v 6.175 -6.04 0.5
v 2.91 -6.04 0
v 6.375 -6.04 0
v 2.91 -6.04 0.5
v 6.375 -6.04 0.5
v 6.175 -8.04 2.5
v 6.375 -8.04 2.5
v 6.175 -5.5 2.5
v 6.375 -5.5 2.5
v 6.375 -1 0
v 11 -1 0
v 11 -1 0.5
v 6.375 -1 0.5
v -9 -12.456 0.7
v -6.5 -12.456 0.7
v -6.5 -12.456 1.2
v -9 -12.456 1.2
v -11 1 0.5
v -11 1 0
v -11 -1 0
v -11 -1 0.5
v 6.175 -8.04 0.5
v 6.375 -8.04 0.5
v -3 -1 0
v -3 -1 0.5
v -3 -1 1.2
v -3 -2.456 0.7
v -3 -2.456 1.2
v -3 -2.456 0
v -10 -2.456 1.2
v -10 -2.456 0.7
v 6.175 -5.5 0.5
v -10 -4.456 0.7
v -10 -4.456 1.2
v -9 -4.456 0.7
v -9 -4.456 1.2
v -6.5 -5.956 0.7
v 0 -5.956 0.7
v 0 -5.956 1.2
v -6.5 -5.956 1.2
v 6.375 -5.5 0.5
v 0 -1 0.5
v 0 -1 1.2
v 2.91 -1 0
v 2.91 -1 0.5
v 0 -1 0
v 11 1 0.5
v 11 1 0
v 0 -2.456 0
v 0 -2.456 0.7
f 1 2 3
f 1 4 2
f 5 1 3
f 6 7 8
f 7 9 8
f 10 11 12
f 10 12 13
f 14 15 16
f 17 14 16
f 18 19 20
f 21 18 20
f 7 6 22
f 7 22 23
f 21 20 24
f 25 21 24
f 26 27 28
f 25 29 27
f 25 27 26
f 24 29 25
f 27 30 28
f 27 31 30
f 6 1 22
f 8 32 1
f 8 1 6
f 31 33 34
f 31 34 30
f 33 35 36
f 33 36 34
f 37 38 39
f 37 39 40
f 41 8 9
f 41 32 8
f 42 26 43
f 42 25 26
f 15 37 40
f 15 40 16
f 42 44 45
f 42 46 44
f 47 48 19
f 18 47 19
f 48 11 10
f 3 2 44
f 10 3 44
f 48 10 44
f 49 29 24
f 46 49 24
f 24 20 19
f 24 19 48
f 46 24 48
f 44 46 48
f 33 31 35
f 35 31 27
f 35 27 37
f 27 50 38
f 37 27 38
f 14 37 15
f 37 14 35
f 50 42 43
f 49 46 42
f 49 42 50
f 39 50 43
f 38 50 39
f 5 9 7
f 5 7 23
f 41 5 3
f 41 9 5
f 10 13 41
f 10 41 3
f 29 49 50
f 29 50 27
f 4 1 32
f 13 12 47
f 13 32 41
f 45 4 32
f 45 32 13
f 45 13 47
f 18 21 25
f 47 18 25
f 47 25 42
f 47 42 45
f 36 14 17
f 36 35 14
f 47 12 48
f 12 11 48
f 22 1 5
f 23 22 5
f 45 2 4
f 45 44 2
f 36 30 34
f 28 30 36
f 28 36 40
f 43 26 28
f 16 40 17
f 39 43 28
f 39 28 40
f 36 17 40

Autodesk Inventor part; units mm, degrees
ref_plane "YZ Plane" through (0, 0, 0) normal (1, 0, 0) x (0, 1, 0)
ref_plane "XZ Plane" through (0, 0, 0) normal (0, 1, 0) x (-1, 0, 0)
ref_plane "XY Plane" through (0, 0, 0) normal (0, 0, 1) x (1, 0, 0)
sketch "Sketch1" plane through (0, 0, 0) normal (0, 0, 1) x (1, 0, 0)
  line L0 (11, -1) -> (11, 1)
  line L1 (11, 1) -> (-11, 1)
  line L2 (-11, 1) -> (-11, -1)
  line L3 (-11, -1) -> (11, 1) construction
  line L4 (11, -1) -> (-11, 1) construction
  line L5 (11, -1) -> (5.2, -1)
  line L6 (5.2, -1) -> (5.2, -8)
  line L7 (5.2, -8) -> (2.2, -8)
  line L8 (2.2, -8) -> (2.2, -1)
  line L9 (2.2, -1) -> (0, -1)
  line L10 (-10, -2.4556) -> (-3, -2.4556)
  line L11 (-3, -2.4556) -> (-3, -1)
  line L12 (-11, -1) -> (-3, -1)
  line L13 (0, -1) -> (2.2, -1)
  line L14 (5.2, -1) -> (11, -1)
  line L15 (-10, -2.4556) -> (-10, -4.4556)
  line L16 (-10, -4.4556) -> (-8.5, -4.4556)
  line L17 (-8.5, -4.4556) -> (-8.5, -12.4556)
  line L18 (-8.5, -12.4556) -> (-6.5, -12.4556)
  line L19 (-6.5, -12.4556) -> (-6.5, -4.4556)
  line L20 (-6.5, -4.4556) -> (0, -4.4556)
  line L21 (0, -1) -> (0, -4.4556)
  line L22 (5.2, -8) -> (5.7, -8)
  line L23 (5.7, -8) -> (5.7, -6)
  line L24 (5.7, -6) -> (5.2, -6)
  line L25 (5.2, -6) -> (5.2, -8)
  point P0 (0, 0)
  dimension "d0" = 22
  dimension "d1" = 2
  dimension "d2" = 5.8
  dimension "d3" = 7
  dimension "d4" = 3
  dimension "d5" = 2.2
  dimension "d8" = 7
  dimension "d9" = 2
  dimension "d11" = 8
  dimension "d12" = 2
  dimension "d13" = 0.5
  dimension "d14" = 2
extrude "Extrusion1" add sketch "Sketch1" along normal blind 0.5 contours L5 L6 L7 L8 L9 L21 L20 L19 L18 L17 L16 L15 L10 L11 L12 L2 L1 L0
sketch "Sketch2" plane through (0, 0, 0.5) normal (0, 0, 1) x (1, 0, 0)
  line L0 (5.2, -8) -> (5.2, -1) projected
  line L1 (5.2, -8) -> (5.7, -8)
  line L2 (5.7, -8) -> (5.7, -6)
  line L3 (5.7, -6) -> (5.2, -6)
  line L4 (5.2, -6) -> (5.2, -8)
  point P0 (0, 0)
  point P1 (5.2, -6)
  dimension "d17" = 0.5
  dimension "d18" = 2
extrude "Extrusion2" add sketch "Sketch2" along normal blind 2
sketch "Sketch3" plane through (0, 0, 0.5) normal (0, 0, -1) x (-1, 0, 0)
  line L0 (-5.7, -6) -> (-5.2, -6) projected
  line L1 (-5.7, -8) -> (-5.7, -6) projected
  line L2 (-5.2, -8) -> (-5.7, -8) projected
  line L3 (-5.2, -8) -> (-5.2, -6) projected
  point P0 (0, 0)
extrude "Extrusion3" add sketch "Sketch3" along normal blind 0.5
sketch "Sketch4" plane through (0, 0, 0.5) normal (0, 0, 1) x (1, 0, 0)
  line L0 (11, 1) -> (-11, 1) projected
  line L1 (-11, 1) -> (-11, -1) projected
  line L2 (-11, -1) -> (-3, -1) projected
  line L3 (-3, -1) -> (-3, -2.4556) projected
  line L4 (-3, -2.4556) -> (-10, -2.4556) projected
  line L5 (-10, -2.4556) -> (-10, -4.4556) projected
  line L6 (-10, -4.4556) -> (-8.5, -4.4556) projected
  line L7 (-8.5, -4.4556) -> (-8.5, -12.4556) projected
  line L8 (-8.5, -12.4556) -> (-6.5, -12.4556) projected
  line L9 (-6.5, -12.4556) -> (-6.5, -4.4556) projected
  line L10 (-6.5, -4.4556) -> (0, -4.4556) projected
  line L11 (0, -4.4556) -> (0, -1) projected
  line L12 (0, -1) -> (2.2, -1) projected
  line L13 (2.2, -1) -> (2.2, -8) projected
  line L14 (2.2, -8) -> (5.2, -8) projected
  line L15 (5.2, -8) -> (5.2, -6) projected
  line L16 (5.2, -6) -> (5.2, -1) projected
  line L17 (5.2, -1) -> (11, -1) projected
  line L18 (11, -1) -> (11, 1) projected
  line L19 (-3, -1) -> (-3, -2.4556) projected
  line L20 (0, -1) -> (2.2, -1) projected
  line L21 (-3, -1) -> (0, -1)
  point P0 (0, 0)
extrude "Extrusion4" add sketch "Sketch4" along normal blind 0.7 contours L21 L11 L10 L9 L8 L7 L6 L5 L4 L3
sketch "Sketch5" plane through (0, 0, 0) normal (0, 0, -1) x (-1, 0, 0)
  line L0 (-11, 1) -> (11, 1) projected
  line L1 (-11, -1) -> (-11, 1) projected
  line L2 (-5.2, -1) -> (-11, -1) projected
  line L3 (-5.2, -6) -> (-5.2, -1) projected
  line L4 (-5.2, -6) -> (-5.7, -6) projected
  line L5 (-5.7, -6) -> (-5.7, -8) projected
  line L6 (-2.2, -8) -> (-5.7, -8) projected
  line L7 (-2.2, -1) -> (-2.2, -8) projected
  line L8 (0, -1) -> (-2.2, -1) projected
  line L9 (0, -4.4556) -> (0, -1) projected
  line L10 (6.5, -4.4556) -> (0, -4.4556) projected
  line L11 (6.5, -12.4556) -> (6.5, -4.4556) projected
  line L12 (8.5, -12.4556) -> (6.5, -12.4556) projected
  line L13 (8.5, -4.4556) -> (8.5, -12.4556) projected
  line L14 (10, -4.4556) -> (8.5, -4.4556) projected
  line L15 (10, -2.4556) -> (10, -4.4556) projected
  line L16 (3, -2.4556) -> (10, -2.4556) projected
  line L17 (3, -1) -> (3, -2.4556) projected
  line L18 (11, -1) -> (3, -1) projected
  line L19 (11, 1) -> (11, -1) projected
  line L20 (3, -2.4556) -> (0, -2.4556)
  line L21 (0, -4.4556) -> (0, -1) projected
  point P0 (0, 0)
extrude "Extrusion5" cut sketch "Sketch5" against normal blind 0.5 contours L16 L15 L14 L13 L12 L11 L10 L9 L20
sketch "Sketch6" plane through (-6.5, -4.4556, 1.2) normal (0, -1, 0) x (1, 0, 0)
  line L0 (6.5, -0.7) -> (6.5, 0) projected
  line L1 (0, 0) -> (6.5, 0) projected
  line L2 (6.5, -0.7) -> (0, -0.7)
  line L3 (0, -0.7) -> (0, 0)
  line L4 (0, 0) -> (6.5, 0)
  line L5 (6.5, 0) -> (6.5, -0.7)
  point P0 (6.5, -1.2)
extrude "Extrusion6" add sketch "Sketch6" along normal blind 1.5
sketch "Sketch7" plane through (5.7, -8, 2.5) normal (1, 0, 0) x (0, 0, -1)
  line L0 (0, 2) -> (2.5, 2) projected
  line L1 (0, 0) -> (0, 2) projected
  line L2 (2.5, 0) -> (0, 0) projected
  line L3 (2.5, 2) -> (2.5, 0) projected
  point P0 (2.5, 8)
extrude "Extrusion7" add sketch "Sketch7" along normal blind 0.5
sketch "Sketch8" plane through (5.2, -8, 0.5) normal (-1, 0, 0) x (0, 0, 1)
  line L0 (0, 0) -> (0, 2) projected
  line L1 (0, 0) -> (2, 0) projected
  line L2 (2, 2) -> (2, 0) projected
  line L3 (0, 2) -> (2, 2) projected
  point P0 (-0.5, 8)
extrude "Extrusion8" cut sketch "Sketch8" against normal blind 0.5
sketch "Sketch9" plane through (0, 0, 1.2) normal (0, 0, 1) x (1, 0, 0)
  line L0 (-10, -2.4556) -> (-10, -4.4556) projected
  line L1 (-10, -4.4556) -> (-8.5, -4.4556) projected
  line L2 (-8.5, -4.4556) -> (-8.5, -12.4556) projected
  line L3 (-8.5, -12.4556) -> (-6.5, -12.4556) projected
  line L4 (-6.5, -12.4556) -> (-6.5, -5.9556) projected
  line L5 (0, -5.9556) -> (-6.5, -5.9556) projected
  line L6 (0, -1) -> (0, -5.9556) projected
  line L7 (0, -1) -> (-3, -1) projected
  line L8 (-3, -1) -> (-3, -2.4556) projected
  line L9 (-3, -2.4556) -> (-10, -2.4556) projected
  point P0 (0, 0)
extrude "Extrusion9" cut sketch "Sketch9" against normal blind 0.2
sketch "Sketch10" plane through (0, 0, 0.5) normal (0, 0, -1) x (-1, 0, 0)
  line L0 (6.5, -12.4556) -> (6.5, -5.9556) projected
  line L1 (8.5, -12.4556) -> (6.5, -12.4556) projected
  line L2 (8.5, -4.4556) -> (8.5, -12.4556) projected
  line L3 (10, -4.4556) -> (8.5, -4.4556) projected
  line L4 (10, -2.4556) -> (10, -4.4556) projected
  line L5 (3, -2.4556) -> (10, -2.4556) projected
  line L6 (0, -2.4556) -> (3, -2.4556) projected
  line L7 (0, -5.9556) -> (0, -2.4556) projected
  line L8 (6.5, -5.9556) -> (0, -5.9556) projected
  point P0 (0, 0)
extrude "Extrusion10" add sketch "Sketch10" along normal blind 0.3
sketch "Sketch11" plane through (0, 0, 1) normal (0, 0, 1) x (1, 0, 0)
  line L0 (-3, -2.4556) -> (-3, -1) projected
  line L1 (-10, -2.4556) -> (-3, -2.4556) projected
  line L2 (-10, -4.4556) -> (-10, -2.4556) projected
  line L3 (-8.5, -4.4556) -> (-10, -4.4556) projected
  line L4 (-8.5, -12.4556) -> (-8.5, -4.4556) projected
  line L5 (-6.5, -12.4556) -> (-8.5, -12.4556) projected
  line L6 (-6.5, -5.9556) -> (-6.5, -12.4556) projected
  line L7 (0, -5.9556) -> (-6.5, -5.9556) projected
  line L8 (0, -1) -> (0, -5.9556) projected
  line L9 (-3, -1) -> (0, -1) projected
  point P0 (0, 0)
extrude "Extrusion11" cut sketch "Sketch11" against normal blind 0.3
sketch "Sketch12" plane through (0, 0, 0.7) normal (0, 0, 1) x (1, 0, 0)
  line L0 (-10, -4.4556) -> (-10, -2.4556) projected
  line L1 (-8.5, -4.4556) -> (-10, -4.4556) projected
  line L2 (-8.5, -12.4556) -> (-8.5, -4.4556) projected
  line L3 (-6.5, -12.4556) -> (-8.5, -12.4556) projected
  line L4 (-6.5, -5.9556) -> (-6.5, -12.4556) projected
  line L5 (0, -5.9556) -> (-6.5, -5.9556) projected
  line L6 (0, -1) -> (0, -5.9556) projected
  line L7 (-3, -1) -> (0, -1) projected
  line L8 (-3, -2.4556) -> (-3, -1) projected
  line L9 (-10, -2.4556) -> (-3, -2.4556) projected
  point P0 (0, 0)
extrude "Extrusion12" add sketch "Sketch12" along normal blind 0.5
sketch "Sketch13" plane through (0, 0, 0.2) normal (0, 0, -1) x (-1, 0, 0)
  line L0 (8.5, -12.4556) -> (8.5, -4.4556) projected
  line L1 (8.5, -4.4556) -> (10, -4.4556) projected
  line L2 (10, -4.4556) -> (10, -2.4556) projected
  line L3 (10, -2.4556) -> (3, -2.4556) projected
  line L4 (0, -2.4556) -> (3, -2.4556) projected
  line L5 (0, -2.4556) -> (0, -5.9556) projected
  line L6 (0, -5.9556) -> (6.5, -5.9556) projected
  line L7 (6.5, -5.9556) -> (6.5, -12.4556) projected
  line L8 (6.5, -12.4556) -> (8.5, -12.4556) projected
  point P0 (0, 0)
extrude "Extrusion13" cut sketch "Sketch13" against normal blind 0.5
sketch "Sketch14" plane through (6.2, -8, 2.5) normal (1, 0, 0) x (0, 0, -1)
  line L0 (0, 0) -> (2.5, 0) projected
  line L1 (2.5, 0) -> (2.5, 2) projected
  line L2 (2.5, 2) -> (0, 2) projected
  line L3 (0, 2) -> (0, 0) projected
  point P0 (2.5, 8)
extrude "Extrusion14" add sketch "Sketch14" along normal blind 0.3
sketch "Sketch15" plane through (5.7, -8, 0.5) normal (-1, 0, 0) x (0, 0, 1)
  line L0 (2, 2) -> (2, 0) projected
  line L1 (0, 2) -> (2, 2) projected
  line L2 (0, 0) -> (0, 2) projected
  line L3 (2, 0) -> (0, 0) projected
  point P0 (-0.5, 8)
extrude "Extrusion15" cut sketch "Sketch15" against normal blind 0.3
sketch "Sketch16" plane through (2.2, -8, 0) normal (-1, 0, 0) x (0, 0, 1)
  line L0 (0, 7) -> (0, 0) projected
  line L1 (0, 0) -> (0.5, 0) projected
  line L2 (0.5, 7) -> (0.5, 0) projected
  line L3 (0, 7) -> (0.5, 7) projected
  point P0 (0, 8)
extrude "Extrusion16" add sketch "Sketch16" along normal blind 0.04
sketch "Sketch17" plane through (6, -8, 0.5) normal (-1, 0, 0) x (0, 0, 1)
  line L0 (0, 0) -> (0, 2) projected
  line L1 (2, 0) -> (0, 0) projected
  line L2 (2, 2) -> (2, 0) projected
  line L3 (0, 2) -> (2, 2) projected
  point P0 (-0.5, 8)
extrude "Extrusion17" add sketch "Sketch17" along normal blind 0.125
sketch "Sketch18" plane through (6.5, -8, 2.5) normal (1, 0, 0) x (0, 0, -1)
  line L0 (2.5, 0) -> (2.5, 2) projected
  line L1 (2.5, 2) -> (0, 2) projected
  line L2 (0, 2) -> (0, 0) projected
  line L3 (0, 0) -> (2.5, 0) projected
  point P0 (2.5, 8)
extrude "Extrusion18" cut sketch "Sketch18" against normal blind 0.125
sketch "Sketch19" plane through (5.2, -1, 0.5) normal (1, 0, 0) x (0, 0, -1)
  line L0 (0, -5) -> (0.5, -5) projected
  line L1 (0.5, -5) -> (0.5, 0) projected
  line L2 (0.5, 0) -> (0, 0) projected
  line L3 (0, -5) -> (0, 0) projected
  point P0 (0.5, 1)
extrude "Extrusion19" add sketch "Sketch19" along normal blind 1.175
sketch "Sketch20" plane through (5.875, -6, 2.5) normal (0, 1, 0) x (1, 0, 0)
  line L0 (0.5, 2) -> (0, 2) projected
  line L1 (0, 0) -> (0, 2) projected
  line L2 (0, 0) -> (0.5, 0) projected
  line L3 (0.5, 0) -> (0.5, 2) projected
  point P0 (-5.875, 2.5)
extrude "Extrusion20" add sketch "Sketch20" along normal blind 2
sketch "Sketch21" plane through (2.16, -8, 0) normal (0, -1, 0) x (1, 0, 0)
  line L0 (4.215, 0) -> (4.215, 2.5) projected
  line L1 (3.715, 2.5) -> (4.215, 2.5) projected
  line L2 (3.715, 0.5) -> (3.715, 2.5) projected
  line L3 (3.715, 0.5) -> (0, 0.5) projected
  line L4 (0, 0) -> (0, 0.5) projected
  line L5 (4.215, 0) -> (0, 0) projected
  point P0 (-2.16, 0)
extrude "Extrusion21" cut sketch "Sketch21" against normal blind 1.96
sketch "Sketch22" plane through (5.875, -4, 2.5) normal (0, 1, 0) x (1, 0, 0)
  line L0 (0.5, 0) -> (0.5, 2) projected
  line L1 (0, 2) -> (0.5, 2) projected
  line L2 (0, 2) -> (0, 0) projected
  line L3 (0, 0) -> (0.5, 0) projected
  point P0 (-5.875, 2.5)
extrude "Extrusion22" cut sketch "Sketch22" against normal blind 1.5
sketch "Sketch23" plane through (2.16, -6.04, 0) normal (0, -1, 0) x (1, 0, 0)
  line L0 (0, 0.5) -> (3.715, 0.5) projected
  line L1 (4.215, 2.5) -> (4.215, 0) projected
  line L2 (3.715, 0.5) -> (4.215, 0.5)
  line L3 (4.215, 0.5) -> (4.215, 2.5)
  line L4 (4.215, 2.5) -> (3.715, 2.5)
  line L5 (3.715, 2.5) -> (3.715, 0.5)
  point P0 (-2.16, 0)
extrude "Extrusion23" add sketch "Sketch23" along normal blind 2
sketch "Sketch24" plane through (2.16, -8, 0) normal (-1, 0, 0) x (0, 0, 1)
  line L0 (0, 1.96) -> (0.5, 1.96) projected
  line L1 (0.5, 1.96) -> (0.5, 7) projected
  line L2 (0, 7) -> (0.5, 7) projected
  line L3 (0, 7) -> (0, 1.96) projected
  point P0 (0, 8)
extrude "Extrusion24" cut sketch "Sketch24" against normal blind 0.75
sketch "Sketch25" plane through (5.875, -8, 0.5) normal (-1, 0, 0) x (0, 0, 1)
  line L0 (2, 2.5) -> (0, 2.5) projected
  line L1 (0, 1.96) -> (0, 2.5) projected
  line L2 (0, 1.96) -> (0, -0.04) projected
  line L3 (2, -0.04) -> (0, -0.04) projected
  line L4 (2, -0.04) -> (2, 2.5) projected
  point P0 (-0.5, 8)
extrude "Extrusion25" cut sketch "Sketch25" against normal blind 0.3
sketch "Sketch26" plane through (-8.5, -12.4556, 1.2) normal (-1, 0, 0) x (0, 0, 1)
  line L0 (-0.5, 8) -> (-0.5, 0) projected
  line L1 (-0.5, 0) -> (0, 0) projected
  line L2 (0, 8) -> (0, 0) projected
  line L3 (-0.5, 8) -> (0, 8) projected
  point P0 (-1.2, 12.4556)
extrude "Extrusion26" add sketch "Sketch26" along normal blind 0.5
properties part number "TerminalR"
